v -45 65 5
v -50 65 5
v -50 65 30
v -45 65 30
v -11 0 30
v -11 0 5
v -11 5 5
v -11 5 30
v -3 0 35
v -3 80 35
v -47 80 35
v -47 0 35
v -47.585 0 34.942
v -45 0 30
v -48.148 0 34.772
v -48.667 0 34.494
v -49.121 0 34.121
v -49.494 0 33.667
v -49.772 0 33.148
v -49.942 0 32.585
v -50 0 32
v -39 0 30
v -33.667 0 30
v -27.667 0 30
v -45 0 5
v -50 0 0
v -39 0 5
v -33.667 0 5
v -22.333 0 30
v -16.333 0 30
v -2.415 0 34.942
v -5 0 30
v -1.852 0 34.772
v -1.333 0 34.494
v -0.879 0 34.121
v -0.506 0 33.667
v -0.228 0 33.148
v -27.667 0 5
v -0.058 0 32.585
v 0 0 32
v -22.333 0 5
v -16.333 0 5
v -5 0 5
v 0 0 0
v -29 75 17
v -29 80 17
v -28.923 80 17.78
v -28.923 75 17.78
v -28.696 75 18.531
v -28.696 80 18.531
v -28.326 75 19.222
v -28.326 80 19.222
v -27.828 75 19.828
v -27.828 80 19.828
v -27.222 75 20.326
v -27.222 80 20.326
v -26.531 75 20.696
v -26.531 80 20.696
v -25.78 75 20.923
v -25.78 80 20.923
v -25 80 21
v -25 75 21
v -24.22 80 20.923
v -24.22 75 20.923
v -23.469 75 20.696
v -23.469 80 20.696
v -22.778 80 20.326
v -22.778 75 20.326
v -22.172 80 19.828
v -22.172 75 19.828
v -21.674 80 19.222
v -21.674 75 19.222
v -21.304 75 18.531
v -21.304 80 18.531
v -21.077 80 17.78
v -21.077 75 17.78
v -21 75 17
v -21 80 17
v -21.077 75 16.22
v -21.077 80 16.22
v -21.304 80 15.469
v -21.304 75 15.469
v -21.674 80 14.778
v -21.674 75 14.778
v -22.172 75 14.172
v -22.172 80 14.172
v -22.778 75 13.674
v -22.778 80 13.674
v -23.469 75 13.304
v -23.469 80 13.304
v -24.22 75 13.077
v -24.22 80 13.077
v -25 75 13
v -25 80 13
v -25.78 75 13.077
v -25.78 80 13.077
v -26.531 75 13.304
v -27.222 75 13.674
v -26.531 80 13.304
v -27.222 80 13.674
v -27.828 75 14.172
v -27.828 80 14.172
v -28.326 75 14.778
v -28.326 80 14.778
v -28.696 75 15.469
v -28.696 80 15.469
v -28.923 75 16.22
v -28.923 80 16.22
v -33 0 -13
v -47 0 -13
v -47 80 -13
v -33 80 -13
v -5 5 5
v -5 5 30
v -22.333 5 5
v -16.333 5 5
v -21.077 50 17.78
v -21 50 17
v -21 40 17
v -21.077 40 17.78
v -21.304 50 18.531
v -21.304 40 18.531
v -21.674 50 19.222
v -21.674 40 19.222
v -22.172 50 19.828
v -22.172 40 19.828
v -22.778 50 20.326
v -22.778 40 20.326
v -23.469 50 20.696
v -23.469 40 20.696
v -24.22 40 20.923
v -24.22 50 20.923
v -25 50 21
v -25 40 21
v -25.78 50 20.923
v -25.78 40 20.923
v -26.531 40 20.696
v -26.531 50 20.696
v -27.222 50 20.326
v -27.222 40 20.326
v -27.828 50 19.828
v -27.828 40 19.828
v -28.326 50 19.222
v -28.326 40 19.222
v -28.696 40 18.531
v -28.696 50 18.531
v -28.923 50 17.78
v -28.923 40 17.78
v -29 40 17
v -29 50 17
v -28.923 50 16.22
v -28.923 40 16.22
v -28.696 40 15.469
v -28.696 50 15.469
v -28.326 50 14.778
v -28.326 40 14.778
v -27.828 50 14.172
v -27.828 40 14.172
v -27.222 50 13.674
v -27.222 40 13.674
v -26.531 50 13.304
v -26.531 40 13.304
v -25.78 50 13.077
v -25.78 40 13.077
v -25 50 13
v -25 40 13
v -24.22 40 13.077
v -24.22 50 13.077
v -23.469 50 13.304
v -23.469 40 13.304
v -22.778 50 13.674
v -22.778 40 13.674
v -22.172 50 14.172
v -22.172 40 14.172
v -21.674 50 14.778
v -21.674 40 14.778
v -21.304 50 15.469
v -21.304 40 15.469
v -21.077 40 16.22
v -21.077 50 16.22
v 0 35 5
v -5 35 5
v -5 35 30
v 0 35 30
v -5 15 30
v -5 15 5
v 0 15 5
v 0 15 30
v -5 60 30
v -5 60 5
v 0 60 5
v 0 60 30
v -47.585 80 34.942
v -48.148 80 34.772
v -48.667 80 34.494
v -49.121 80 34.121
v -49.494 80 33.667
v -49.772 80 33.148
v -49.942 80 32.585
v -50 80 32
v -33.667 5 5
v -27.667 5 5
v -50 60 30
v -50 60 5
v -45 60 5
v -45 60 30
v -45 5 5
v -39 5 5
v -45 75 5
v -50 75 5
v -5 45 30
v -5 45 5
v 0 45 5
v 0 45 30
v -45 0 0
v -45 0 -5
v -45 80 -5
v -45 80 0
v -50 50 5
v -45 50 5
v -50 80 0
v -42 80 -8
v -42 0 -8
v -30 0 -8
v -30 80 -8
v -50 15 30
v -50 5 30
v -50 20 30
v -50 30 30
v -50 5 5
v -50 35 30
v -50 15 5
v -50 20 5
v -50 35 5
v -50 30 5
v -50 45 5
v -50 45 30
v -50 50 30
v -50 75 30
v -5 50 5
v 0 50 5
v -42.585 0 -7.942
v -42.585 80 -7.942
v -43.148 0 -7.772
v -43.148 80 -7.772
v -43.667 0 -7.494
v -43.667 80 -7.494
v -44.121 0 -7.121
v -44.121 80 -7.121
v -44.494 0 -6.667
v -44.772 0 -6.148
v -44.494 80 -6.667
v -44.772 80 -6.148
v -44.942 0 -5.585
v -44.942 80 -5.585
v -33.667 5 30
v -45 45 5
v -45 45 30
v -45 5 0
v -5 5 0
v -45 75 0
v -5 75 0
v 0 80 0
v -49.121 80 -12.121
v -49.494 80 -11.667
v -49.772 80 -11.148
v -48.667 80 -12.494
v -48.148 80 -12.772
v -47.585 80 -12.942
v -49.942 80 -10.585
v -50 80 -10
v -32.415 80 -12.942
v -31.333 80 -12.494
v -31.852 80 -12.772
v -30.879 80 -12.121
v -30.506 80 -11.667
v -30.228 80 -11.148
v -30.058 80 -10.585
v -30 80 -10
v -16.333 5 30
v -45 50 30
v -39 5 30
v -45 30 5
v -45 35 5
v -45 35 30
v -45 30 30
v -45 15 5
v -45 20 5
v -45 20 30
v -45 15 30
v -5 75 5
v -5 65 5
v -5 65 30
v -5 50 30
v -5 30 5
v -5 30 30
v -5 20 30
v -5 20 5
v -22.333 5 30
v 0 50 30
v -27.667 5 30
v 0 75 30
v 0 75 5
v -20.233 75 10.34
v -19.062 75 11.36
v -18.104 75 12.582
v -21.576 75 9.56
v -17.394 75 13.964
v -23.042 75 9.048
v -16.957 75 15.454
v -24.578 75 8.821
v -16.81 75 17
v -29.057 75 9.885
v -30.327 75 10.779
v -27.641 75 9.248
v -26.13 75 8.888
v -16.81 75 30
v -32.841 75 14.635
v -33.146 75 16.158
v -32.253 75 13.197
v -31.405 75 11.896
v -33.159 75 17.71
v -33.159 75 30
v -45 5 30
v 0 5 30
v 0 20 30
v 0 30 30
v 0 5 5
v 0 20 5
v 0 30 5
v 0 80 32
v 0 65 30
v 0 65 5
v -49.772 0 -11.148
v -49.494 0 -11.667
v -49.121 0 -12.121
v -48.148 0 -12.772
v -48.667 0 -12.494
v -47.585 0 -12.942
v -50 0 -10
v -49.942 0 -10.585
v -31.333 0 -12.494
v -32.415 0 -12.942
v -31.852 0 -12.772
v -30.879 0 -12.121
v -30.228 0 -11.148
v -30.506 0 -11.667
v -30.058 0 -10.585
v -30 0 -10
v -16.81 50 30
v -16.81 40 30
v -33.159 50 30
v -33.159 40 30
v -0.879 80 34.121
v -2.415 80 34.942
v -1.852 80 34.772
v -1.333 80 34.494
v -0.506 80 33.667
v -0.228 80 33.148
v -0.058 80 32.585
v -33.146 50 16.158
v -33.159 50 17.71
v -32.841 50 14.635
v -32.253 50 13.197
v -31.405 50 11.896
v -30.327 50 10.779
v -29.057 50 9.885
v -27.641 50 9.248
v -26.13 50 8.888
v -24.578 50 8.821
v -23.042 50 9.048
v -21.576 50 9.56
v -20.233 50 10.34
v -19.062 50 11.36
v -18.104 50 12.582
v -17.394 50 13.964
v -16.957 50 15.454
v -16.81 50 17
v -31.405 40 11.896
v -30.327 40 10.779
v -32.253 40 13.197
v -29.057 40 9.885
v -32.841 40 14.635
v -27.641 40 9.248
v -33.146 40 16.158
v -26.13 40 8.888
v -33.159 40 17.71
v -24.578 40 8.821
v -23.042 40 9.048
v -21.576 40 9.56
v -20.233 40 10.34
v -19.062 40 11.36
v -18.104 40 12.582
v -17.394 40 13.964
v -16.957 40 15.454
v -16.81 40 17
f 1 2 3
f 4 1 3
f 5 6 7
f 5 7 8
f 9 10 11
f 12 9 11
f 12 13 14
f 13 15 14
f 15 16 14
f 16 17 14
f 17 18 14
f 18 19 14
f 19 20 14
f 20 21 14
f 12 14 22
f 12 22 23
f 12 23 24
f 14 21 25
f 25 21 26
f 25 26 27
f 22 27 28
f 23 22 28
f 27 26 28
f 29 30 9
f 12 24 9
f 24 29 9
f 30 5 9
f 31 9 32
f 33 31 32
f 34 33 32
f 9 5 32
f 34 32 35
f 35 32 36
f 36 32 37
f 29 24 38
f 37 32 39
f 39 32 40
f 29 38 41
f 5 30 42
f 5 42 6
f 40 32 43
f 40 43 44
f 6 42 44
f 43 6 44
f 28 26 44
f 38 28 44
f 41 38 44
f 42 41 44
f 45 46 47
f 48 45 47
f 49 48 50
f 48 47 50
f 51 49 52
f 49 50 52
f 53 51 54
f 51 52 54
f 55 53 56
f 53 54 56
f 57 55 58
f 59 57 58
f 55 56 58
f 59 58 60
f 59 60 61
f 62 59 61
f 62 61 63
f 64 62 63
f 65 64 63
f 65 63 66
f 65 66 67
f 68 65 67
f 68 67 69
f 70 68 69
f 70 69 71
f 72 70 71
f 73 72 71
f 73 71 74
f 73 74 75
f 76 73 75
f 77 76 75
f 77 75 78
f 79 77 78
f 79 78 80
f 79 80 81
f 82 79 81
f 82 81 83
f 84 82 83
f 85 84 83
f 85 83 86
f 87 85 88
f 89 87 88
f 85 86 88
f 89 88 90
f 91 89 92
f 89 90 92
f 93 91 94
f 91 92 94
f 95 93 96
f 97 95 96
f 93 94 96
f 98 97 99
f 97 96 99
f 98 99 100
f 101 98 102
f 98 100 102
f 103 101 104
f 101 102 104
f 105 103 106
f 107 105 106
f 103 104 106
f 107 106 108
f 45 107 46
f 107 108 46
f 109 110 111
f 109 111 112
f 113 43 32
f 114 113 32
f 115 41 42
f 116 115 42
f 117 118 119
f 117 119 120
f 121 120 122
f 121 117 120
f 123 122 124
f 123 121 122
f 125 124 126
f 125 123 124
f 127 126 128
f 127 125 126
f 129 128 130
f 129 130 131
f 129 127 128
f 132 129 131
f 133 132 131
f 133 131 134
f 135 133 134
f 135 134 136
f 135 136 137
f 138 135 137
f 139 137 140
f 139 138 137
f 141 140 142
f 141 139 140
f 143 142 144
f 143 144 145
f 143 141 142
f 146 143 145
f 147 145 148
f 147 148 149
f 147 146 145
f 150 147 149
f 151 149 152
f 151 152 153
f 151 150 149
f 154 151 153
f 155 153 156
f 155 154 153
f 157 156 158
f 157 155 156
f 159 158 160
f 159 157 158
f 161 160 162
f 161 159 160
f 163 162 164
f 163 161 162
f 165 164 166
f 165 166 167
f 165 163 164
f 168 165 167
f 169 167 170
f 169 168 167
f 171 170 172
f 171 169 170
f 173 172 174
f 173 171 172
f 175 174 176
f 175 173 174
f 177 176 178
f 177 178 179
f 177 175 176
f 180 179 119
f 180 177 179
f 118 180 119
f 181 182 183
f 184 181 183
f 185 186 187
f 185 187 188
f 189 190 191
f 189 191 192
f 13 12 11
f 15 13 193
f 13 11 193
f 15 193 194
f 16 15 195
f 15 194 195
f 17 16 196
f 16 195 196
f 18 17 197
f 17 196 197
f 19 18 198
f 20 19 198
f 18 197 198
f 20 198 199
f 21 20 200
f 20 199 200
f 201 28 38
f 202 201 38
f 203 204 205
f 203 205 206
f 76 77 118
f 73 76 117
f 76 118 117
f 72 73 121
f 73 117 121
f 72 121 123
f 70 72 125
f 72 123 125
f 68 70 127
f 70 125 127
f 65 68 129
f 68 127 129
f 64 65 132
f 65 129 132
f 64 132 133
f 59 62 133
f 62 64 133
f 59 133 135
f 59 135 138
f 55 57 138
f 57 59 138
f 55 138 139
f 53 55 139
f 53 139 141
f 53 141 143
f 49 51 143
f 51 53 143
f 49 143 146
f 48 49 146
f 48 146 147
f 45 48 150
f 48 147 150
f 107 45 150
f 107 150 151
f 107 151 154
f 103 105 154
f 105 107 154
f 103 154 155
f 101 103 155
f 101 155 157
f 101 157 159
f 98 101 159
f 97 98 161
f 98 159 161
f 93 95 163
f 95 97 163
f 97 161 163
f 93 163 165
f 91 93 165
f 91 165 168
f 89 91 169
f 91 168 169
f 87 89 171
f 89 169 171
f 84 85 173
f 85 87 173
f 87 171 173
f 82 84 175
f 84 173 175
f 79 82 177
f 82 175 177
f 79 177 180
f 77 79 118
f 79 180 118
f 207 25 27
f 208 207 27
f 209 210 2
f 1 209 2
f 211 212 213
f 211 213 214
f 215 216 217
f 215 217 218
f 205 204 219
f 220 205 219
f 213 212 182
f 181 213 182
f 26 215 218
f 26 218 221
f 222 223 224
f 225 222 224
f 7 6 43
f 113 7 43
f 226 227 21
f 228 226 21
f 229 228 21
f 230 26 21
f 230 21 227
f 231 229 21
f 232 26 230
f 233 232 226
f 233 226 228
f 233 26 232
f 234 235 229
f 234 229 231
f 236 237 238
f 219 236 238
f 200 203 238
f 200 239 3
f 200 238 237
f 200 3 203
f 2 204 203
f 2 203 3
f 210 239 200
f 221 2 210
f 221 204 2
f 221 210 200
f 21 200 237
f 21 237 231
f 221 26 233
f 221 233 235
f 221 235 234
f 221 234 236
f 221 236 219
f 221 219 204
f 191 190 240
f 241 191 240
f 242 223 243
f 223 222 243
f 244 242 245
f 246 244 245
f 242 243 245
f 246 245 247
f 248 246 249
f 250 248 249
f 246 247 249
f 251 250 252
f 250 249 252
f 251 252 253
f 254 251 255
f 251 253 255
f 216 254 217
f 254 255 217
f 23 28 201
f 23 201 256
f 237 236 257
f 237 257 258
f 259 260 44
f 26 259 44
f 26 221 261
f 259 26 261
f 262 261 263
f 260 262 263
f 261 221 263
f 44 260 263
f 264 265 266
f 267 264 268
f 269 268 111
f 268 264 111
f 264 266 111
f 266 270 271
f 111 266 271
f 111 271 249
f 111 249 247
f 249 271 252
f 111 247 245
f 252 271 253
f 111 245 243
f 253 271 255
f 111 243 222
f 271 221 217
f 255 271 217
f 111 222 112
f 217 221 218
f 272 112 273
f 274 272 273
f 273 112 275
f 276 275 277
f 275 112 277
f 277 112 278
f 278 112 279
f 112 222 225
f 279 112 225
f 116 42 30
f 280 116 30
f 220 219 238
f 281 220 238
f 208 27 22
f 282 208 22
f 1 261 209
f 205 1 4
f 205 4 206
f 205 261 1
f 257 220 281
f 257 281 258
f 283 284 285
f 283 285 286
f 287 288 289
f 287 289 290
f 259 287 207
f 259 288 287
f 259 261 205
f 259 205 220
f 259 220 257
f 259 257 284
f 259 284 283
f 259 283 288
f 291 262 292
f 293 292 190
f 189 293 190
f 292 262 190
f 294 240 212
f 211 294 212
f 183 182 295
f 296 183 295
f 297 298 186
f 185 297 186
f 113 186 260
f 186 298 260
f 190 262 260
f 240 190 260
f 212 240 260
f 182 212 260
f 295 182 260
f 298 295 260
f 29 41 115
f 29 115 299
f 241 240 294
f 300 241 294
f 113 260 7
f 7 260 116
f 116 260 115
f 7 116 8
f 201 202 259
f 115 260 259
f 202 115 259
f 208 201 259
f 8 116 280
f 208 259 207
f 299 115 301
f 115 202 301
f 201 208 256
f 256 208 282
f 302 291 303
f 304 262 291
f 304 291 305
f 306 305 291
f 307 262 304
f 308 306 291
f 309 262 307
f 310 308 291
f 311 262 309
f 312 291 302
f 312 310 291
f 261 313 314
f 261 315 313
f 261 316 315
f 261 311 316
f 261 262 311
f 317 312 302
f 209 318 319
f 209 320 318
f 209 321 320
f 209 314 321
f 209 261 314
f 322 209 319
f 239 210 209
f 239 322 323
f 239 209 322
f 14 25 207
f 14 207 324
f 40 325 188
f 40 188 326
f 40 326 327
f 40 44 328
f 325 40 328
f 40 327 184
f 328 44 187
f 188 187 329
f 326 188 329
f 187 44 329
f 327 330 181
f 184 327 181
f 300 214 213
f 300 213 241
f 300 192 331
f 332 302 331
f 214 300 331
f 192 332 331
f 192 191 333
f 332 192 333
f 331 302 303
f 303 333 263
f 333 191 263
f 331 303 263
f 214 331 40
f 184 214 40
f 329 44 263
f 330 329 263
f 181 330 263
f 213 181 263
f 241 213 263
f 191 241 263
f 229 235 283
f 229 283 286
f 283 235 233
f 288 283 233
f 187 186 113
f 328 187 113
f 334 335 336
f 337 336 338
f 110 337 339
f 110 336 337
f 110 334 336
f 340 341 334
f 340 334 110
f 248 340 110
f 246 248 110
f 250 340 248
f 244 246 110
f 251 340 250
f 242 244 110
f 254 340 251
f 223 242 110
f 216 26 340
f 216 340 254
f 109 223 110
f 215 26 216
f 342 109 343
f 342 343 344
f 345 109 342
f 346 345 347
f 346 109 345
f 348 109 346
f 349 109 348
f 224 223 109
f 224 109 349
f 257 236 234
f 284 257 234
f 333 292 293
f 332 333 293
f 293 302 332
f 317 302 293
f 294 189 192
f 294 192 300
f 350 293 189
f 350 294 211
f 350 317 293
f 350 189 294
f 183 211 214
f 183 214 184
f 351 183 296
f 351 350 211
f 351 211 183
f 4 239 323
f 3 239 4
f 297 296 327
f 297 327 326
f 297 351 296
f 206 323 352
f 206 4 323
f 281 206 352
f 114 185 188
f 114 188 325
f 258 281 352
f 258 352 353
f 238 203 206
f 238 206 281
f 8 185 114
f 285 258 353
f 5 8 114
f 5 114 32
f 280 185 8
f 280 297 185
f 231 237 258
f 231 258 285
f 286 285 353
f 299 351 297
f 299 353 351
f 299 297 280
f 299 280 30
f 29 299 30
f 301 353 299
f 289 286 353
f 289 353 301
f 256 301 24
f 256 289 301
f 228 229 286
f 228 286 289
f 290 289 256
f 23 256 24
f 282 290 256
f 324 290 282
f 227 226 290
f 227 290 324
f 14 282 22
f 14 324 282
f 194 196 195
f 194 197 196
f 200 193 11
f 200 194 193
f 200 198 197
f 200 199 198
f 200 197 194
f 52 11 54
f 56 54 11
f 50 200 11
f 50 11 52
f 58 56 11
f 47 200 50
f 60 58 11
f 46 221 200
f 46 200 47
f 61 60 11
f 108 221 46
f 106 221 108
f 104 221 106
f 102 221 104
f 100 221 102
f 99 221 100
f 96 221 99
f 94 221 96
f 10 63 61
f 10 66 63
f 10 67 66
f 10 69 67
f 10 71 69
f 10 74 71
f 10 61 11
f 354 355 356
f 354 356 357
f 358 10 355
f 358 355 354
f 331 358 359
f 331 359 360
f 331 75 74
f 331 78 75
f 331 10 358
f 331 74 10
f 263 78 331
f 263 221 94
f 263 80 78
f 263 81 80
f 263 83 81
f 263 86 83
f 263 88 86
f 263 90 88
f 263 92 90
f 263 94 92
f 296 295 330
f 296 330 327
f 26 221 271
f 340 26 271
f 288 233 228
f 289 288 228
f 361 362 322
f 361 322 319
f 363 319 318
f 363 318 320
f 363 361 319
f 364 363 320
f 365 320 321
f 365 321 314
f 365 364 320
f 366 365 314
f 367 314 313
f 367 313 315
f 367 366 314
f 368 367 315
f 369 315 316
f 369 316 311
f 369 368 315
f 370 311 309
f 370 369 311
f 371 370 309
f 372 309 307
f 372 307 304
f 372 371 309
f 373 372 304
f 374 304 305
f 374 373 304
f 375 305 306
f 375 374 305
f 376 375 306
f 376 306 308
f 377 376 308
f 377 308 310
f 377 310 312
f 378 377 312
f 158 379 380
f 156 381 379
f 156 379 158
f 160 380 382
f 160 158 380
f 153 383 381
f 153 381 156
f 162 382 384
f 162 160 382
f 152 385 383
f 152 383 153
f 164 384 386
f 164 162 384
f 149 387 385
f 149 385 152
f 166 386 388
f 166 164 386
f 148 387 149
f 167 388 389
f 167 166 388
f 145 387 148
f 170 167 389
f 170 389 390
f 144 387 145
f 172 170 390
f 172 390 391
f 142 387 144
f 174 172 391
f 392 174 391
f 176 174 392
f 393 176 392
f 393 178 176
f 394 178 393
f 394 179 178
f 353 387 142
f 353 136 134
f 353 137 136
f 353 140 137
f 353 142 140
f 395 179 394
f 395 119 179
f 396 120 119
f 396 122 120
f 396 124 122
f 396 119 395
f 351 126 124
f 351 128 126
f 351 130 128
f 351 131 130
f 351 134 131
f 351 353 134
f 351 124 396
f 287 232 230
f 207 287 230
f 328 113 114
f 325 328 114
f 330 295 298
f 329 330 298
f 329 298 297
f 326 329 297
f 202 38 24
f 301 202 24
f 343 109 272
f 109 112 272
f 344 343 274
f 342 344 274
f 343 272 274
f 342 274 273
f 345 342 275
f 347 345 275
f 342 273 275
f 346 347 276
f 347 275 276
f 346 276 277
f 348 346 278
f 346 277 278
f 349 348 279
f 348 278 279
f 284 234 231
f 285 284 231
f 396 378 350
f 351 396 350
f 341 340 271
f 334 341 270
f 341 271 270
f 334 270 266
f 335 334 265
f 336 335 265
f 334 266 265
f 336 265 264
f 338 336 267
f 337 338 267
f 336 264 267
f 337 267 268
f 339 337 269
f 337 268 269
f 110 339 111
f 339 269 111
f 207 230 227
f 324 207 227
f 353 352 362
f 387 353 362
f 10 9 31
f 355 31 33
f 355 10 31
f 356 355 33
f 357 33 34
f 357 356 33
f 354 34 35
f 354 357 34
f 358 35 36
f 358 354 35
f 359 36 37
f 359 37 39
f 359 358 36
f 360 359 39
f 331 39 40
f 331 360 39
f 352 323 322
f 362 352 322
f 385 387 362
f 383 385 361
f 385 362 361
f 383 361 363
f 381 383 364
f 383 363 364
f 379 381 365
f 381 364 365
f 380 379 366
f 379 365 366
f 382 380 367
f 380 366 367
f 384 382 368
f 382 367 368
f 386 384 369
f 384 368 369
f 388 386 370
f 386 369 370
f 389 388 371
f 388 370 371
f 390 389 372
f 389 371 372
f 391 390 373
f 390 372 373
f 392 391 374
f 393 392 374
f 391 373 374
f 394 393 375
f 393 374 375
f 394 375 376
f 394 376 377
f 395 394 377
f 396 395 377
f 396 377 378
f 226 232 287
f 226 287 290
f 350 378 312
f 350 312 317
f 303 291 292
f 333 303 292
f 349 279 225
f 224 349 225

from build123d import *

# Parameters (mm, degrees)
F0_W      = 50
F0_H      = 80
F1_DEPTH  = 35
F2_W      = 40
F2_H      = 70
F3_DEPTH  = 30
F4_R      = 4
F5_DEPTH  = 5
F6_W      = 10
F6_H      = 25
F7_DEPTH  = 50.001
F8_W      = 6
F8_H      = 25
F9_DEPTH  = 5
F11_R     = 4
F12_DEPTH = 10
F13_W     = 15
F13_H     = 5
F14_DEPTH = 80
F15_R     = 3
F15_2_R   = 3
F16_DEPTH = 25


with BuildPart() as f1:
    # F0 (on Top) → F1 (new body)
    with BuildSketch(Plane.XY):
        with Locations((-25, 40)):
            Rectangle(F0_W, F0_H)
    extrude(amount=F1_DEPTH)

    # F2 (on face) → F3 (cut)
    with BuildSketch(Plane(origin=(0, 0, 0), x_dir=(1, 0, 0), z_dir=(0, 0, -1))):
        with Locations((-25, -40)):
            Rectangle(F2_W, F2_H)
    extrude(amount=-F3_DEPTH, mode=Mode.SUBTRACT)

    # F4 (on face) → F5 (cut, through all)
    with BuildSketch(Plane(origin=(0, 80, 0), x_dir=(-1, 0, 0), z_dir=(0, 1, 0))):
        with Locations((25, 17)):
            Circle(F4_R)
    extrude(amount=-F5_DEPTH, mode=Mode.SUBTRACT)

    # F6 (on face) → F7 (cut, through all)
    with BuildSketch(Plane(origin=(-50, 0, 0), x_dir=(0, -1, 0), z_dir=(-1, 0, 0))):
        with Locations((-70, 17.5)):
            Rectangle(F6_W, F6_H)
        with Locations((-55, 17.5)):
            Rectangle(F6_W, F6_H)
        with Locations((-40, 17.5)):
            Rectangle(F6_W, F6_H)
        with Locations((-25, 17.5)):
            Rectangle(F6_W, F6_H)
        with Locations((-10, 17.5)):
            Rectangle(F6_W, F6_H)
    extrude(amount=-F7_DEPTH, mode=Mode.SUBTRACT)

    # F8 (on face) → F9 (cut, through all)
    with BuildSketch(Plane.XZ):
        with Locations((-42, 17.5)):
            Rectangle(F8_W, F8_H)
        with Locations((-30.666667, 17.5)):
            Rectangle(F8_W, F8_H)
        with Locations((-19.333333, 17.5)):
            Rectangle(F8_W, F8_H)
        with Locations((-8, 17.5)):
            Rectangle(F8_W, F8_H)
    extrude(amount=-F9_DEPTH, mode=Mode.SUBTRACT)

    # F11 (on offset) → F12 (join)
    with BuildSketch(Plane.XZ.offset(-50)):
        with BuildLine():
            Line((-33.158947, 35), (-33.158947, 17.710462))
            ThreePointArc((-33.158947, 17.710462), (-25.355566, 8.817901), (-16.810179, 17))
            Line((-16.810179, 17), (-16.810179, 35))
            Line((-16.810179, 35), (-33.158947, 35))
        make_face()
        with Locations((-25, 17)):
            Circle(F11_R, mode=Mode.SUBTRACT)
    extrude(amount=F12_DEPTH)

    # F15#2
    f15_2_edges = [f1.edges().sort_by_distance(p)[0] for p in [
        (-50, 40, 35),
        (0, 40, 35),
    ]]
    fillet(f15_2_edges, radius=F15_2_R)

    # F11 (on offset) → F16 (join)
    with BuildSketch(Plane.XZ.offset(-50)):
        with BuildLine():
            Line((-33.158947, 35), (-33.158947, 17.710462))
            ThreePointArc((-33.158947, 17.710462), (-25.355566, 8.817901), (-16.810179, 17))
            Line((-16.810179, 17), (-16.810179, 35))
            Line((-16.810179, 35), (-33.158947, 35))
        make_face()
        with Locations((-25, 17)):
            Circle(F11_R, mode=Mode.SUBTRACT)
    extrude(amount=-F16_DEPTH)


with BuildPart() as f14:
    # F13 (on Front) → F14 (new body)
    with BuildSketch(Plane.XZ):
        Polygon((-45, -8), (-45, 0), (-50, 0), (-50, -13), (-45, -13), align=None)
        with Locations((-37.5, -10.5)):
            Rectangle(F13_W, F13_H)
    extrude(amount=-F14_DEPTH)

    # F15
    f15_edges = [f14.edges().sort_by_distance(p)[0] for p in [
        (-45, 40, -8),
        (-50, 40, -13),
        (-30, 40, -13),
    ]]
    fillet(f15_edges, radius=F15_R)


solid = Compound([f1.part, f14.part])
